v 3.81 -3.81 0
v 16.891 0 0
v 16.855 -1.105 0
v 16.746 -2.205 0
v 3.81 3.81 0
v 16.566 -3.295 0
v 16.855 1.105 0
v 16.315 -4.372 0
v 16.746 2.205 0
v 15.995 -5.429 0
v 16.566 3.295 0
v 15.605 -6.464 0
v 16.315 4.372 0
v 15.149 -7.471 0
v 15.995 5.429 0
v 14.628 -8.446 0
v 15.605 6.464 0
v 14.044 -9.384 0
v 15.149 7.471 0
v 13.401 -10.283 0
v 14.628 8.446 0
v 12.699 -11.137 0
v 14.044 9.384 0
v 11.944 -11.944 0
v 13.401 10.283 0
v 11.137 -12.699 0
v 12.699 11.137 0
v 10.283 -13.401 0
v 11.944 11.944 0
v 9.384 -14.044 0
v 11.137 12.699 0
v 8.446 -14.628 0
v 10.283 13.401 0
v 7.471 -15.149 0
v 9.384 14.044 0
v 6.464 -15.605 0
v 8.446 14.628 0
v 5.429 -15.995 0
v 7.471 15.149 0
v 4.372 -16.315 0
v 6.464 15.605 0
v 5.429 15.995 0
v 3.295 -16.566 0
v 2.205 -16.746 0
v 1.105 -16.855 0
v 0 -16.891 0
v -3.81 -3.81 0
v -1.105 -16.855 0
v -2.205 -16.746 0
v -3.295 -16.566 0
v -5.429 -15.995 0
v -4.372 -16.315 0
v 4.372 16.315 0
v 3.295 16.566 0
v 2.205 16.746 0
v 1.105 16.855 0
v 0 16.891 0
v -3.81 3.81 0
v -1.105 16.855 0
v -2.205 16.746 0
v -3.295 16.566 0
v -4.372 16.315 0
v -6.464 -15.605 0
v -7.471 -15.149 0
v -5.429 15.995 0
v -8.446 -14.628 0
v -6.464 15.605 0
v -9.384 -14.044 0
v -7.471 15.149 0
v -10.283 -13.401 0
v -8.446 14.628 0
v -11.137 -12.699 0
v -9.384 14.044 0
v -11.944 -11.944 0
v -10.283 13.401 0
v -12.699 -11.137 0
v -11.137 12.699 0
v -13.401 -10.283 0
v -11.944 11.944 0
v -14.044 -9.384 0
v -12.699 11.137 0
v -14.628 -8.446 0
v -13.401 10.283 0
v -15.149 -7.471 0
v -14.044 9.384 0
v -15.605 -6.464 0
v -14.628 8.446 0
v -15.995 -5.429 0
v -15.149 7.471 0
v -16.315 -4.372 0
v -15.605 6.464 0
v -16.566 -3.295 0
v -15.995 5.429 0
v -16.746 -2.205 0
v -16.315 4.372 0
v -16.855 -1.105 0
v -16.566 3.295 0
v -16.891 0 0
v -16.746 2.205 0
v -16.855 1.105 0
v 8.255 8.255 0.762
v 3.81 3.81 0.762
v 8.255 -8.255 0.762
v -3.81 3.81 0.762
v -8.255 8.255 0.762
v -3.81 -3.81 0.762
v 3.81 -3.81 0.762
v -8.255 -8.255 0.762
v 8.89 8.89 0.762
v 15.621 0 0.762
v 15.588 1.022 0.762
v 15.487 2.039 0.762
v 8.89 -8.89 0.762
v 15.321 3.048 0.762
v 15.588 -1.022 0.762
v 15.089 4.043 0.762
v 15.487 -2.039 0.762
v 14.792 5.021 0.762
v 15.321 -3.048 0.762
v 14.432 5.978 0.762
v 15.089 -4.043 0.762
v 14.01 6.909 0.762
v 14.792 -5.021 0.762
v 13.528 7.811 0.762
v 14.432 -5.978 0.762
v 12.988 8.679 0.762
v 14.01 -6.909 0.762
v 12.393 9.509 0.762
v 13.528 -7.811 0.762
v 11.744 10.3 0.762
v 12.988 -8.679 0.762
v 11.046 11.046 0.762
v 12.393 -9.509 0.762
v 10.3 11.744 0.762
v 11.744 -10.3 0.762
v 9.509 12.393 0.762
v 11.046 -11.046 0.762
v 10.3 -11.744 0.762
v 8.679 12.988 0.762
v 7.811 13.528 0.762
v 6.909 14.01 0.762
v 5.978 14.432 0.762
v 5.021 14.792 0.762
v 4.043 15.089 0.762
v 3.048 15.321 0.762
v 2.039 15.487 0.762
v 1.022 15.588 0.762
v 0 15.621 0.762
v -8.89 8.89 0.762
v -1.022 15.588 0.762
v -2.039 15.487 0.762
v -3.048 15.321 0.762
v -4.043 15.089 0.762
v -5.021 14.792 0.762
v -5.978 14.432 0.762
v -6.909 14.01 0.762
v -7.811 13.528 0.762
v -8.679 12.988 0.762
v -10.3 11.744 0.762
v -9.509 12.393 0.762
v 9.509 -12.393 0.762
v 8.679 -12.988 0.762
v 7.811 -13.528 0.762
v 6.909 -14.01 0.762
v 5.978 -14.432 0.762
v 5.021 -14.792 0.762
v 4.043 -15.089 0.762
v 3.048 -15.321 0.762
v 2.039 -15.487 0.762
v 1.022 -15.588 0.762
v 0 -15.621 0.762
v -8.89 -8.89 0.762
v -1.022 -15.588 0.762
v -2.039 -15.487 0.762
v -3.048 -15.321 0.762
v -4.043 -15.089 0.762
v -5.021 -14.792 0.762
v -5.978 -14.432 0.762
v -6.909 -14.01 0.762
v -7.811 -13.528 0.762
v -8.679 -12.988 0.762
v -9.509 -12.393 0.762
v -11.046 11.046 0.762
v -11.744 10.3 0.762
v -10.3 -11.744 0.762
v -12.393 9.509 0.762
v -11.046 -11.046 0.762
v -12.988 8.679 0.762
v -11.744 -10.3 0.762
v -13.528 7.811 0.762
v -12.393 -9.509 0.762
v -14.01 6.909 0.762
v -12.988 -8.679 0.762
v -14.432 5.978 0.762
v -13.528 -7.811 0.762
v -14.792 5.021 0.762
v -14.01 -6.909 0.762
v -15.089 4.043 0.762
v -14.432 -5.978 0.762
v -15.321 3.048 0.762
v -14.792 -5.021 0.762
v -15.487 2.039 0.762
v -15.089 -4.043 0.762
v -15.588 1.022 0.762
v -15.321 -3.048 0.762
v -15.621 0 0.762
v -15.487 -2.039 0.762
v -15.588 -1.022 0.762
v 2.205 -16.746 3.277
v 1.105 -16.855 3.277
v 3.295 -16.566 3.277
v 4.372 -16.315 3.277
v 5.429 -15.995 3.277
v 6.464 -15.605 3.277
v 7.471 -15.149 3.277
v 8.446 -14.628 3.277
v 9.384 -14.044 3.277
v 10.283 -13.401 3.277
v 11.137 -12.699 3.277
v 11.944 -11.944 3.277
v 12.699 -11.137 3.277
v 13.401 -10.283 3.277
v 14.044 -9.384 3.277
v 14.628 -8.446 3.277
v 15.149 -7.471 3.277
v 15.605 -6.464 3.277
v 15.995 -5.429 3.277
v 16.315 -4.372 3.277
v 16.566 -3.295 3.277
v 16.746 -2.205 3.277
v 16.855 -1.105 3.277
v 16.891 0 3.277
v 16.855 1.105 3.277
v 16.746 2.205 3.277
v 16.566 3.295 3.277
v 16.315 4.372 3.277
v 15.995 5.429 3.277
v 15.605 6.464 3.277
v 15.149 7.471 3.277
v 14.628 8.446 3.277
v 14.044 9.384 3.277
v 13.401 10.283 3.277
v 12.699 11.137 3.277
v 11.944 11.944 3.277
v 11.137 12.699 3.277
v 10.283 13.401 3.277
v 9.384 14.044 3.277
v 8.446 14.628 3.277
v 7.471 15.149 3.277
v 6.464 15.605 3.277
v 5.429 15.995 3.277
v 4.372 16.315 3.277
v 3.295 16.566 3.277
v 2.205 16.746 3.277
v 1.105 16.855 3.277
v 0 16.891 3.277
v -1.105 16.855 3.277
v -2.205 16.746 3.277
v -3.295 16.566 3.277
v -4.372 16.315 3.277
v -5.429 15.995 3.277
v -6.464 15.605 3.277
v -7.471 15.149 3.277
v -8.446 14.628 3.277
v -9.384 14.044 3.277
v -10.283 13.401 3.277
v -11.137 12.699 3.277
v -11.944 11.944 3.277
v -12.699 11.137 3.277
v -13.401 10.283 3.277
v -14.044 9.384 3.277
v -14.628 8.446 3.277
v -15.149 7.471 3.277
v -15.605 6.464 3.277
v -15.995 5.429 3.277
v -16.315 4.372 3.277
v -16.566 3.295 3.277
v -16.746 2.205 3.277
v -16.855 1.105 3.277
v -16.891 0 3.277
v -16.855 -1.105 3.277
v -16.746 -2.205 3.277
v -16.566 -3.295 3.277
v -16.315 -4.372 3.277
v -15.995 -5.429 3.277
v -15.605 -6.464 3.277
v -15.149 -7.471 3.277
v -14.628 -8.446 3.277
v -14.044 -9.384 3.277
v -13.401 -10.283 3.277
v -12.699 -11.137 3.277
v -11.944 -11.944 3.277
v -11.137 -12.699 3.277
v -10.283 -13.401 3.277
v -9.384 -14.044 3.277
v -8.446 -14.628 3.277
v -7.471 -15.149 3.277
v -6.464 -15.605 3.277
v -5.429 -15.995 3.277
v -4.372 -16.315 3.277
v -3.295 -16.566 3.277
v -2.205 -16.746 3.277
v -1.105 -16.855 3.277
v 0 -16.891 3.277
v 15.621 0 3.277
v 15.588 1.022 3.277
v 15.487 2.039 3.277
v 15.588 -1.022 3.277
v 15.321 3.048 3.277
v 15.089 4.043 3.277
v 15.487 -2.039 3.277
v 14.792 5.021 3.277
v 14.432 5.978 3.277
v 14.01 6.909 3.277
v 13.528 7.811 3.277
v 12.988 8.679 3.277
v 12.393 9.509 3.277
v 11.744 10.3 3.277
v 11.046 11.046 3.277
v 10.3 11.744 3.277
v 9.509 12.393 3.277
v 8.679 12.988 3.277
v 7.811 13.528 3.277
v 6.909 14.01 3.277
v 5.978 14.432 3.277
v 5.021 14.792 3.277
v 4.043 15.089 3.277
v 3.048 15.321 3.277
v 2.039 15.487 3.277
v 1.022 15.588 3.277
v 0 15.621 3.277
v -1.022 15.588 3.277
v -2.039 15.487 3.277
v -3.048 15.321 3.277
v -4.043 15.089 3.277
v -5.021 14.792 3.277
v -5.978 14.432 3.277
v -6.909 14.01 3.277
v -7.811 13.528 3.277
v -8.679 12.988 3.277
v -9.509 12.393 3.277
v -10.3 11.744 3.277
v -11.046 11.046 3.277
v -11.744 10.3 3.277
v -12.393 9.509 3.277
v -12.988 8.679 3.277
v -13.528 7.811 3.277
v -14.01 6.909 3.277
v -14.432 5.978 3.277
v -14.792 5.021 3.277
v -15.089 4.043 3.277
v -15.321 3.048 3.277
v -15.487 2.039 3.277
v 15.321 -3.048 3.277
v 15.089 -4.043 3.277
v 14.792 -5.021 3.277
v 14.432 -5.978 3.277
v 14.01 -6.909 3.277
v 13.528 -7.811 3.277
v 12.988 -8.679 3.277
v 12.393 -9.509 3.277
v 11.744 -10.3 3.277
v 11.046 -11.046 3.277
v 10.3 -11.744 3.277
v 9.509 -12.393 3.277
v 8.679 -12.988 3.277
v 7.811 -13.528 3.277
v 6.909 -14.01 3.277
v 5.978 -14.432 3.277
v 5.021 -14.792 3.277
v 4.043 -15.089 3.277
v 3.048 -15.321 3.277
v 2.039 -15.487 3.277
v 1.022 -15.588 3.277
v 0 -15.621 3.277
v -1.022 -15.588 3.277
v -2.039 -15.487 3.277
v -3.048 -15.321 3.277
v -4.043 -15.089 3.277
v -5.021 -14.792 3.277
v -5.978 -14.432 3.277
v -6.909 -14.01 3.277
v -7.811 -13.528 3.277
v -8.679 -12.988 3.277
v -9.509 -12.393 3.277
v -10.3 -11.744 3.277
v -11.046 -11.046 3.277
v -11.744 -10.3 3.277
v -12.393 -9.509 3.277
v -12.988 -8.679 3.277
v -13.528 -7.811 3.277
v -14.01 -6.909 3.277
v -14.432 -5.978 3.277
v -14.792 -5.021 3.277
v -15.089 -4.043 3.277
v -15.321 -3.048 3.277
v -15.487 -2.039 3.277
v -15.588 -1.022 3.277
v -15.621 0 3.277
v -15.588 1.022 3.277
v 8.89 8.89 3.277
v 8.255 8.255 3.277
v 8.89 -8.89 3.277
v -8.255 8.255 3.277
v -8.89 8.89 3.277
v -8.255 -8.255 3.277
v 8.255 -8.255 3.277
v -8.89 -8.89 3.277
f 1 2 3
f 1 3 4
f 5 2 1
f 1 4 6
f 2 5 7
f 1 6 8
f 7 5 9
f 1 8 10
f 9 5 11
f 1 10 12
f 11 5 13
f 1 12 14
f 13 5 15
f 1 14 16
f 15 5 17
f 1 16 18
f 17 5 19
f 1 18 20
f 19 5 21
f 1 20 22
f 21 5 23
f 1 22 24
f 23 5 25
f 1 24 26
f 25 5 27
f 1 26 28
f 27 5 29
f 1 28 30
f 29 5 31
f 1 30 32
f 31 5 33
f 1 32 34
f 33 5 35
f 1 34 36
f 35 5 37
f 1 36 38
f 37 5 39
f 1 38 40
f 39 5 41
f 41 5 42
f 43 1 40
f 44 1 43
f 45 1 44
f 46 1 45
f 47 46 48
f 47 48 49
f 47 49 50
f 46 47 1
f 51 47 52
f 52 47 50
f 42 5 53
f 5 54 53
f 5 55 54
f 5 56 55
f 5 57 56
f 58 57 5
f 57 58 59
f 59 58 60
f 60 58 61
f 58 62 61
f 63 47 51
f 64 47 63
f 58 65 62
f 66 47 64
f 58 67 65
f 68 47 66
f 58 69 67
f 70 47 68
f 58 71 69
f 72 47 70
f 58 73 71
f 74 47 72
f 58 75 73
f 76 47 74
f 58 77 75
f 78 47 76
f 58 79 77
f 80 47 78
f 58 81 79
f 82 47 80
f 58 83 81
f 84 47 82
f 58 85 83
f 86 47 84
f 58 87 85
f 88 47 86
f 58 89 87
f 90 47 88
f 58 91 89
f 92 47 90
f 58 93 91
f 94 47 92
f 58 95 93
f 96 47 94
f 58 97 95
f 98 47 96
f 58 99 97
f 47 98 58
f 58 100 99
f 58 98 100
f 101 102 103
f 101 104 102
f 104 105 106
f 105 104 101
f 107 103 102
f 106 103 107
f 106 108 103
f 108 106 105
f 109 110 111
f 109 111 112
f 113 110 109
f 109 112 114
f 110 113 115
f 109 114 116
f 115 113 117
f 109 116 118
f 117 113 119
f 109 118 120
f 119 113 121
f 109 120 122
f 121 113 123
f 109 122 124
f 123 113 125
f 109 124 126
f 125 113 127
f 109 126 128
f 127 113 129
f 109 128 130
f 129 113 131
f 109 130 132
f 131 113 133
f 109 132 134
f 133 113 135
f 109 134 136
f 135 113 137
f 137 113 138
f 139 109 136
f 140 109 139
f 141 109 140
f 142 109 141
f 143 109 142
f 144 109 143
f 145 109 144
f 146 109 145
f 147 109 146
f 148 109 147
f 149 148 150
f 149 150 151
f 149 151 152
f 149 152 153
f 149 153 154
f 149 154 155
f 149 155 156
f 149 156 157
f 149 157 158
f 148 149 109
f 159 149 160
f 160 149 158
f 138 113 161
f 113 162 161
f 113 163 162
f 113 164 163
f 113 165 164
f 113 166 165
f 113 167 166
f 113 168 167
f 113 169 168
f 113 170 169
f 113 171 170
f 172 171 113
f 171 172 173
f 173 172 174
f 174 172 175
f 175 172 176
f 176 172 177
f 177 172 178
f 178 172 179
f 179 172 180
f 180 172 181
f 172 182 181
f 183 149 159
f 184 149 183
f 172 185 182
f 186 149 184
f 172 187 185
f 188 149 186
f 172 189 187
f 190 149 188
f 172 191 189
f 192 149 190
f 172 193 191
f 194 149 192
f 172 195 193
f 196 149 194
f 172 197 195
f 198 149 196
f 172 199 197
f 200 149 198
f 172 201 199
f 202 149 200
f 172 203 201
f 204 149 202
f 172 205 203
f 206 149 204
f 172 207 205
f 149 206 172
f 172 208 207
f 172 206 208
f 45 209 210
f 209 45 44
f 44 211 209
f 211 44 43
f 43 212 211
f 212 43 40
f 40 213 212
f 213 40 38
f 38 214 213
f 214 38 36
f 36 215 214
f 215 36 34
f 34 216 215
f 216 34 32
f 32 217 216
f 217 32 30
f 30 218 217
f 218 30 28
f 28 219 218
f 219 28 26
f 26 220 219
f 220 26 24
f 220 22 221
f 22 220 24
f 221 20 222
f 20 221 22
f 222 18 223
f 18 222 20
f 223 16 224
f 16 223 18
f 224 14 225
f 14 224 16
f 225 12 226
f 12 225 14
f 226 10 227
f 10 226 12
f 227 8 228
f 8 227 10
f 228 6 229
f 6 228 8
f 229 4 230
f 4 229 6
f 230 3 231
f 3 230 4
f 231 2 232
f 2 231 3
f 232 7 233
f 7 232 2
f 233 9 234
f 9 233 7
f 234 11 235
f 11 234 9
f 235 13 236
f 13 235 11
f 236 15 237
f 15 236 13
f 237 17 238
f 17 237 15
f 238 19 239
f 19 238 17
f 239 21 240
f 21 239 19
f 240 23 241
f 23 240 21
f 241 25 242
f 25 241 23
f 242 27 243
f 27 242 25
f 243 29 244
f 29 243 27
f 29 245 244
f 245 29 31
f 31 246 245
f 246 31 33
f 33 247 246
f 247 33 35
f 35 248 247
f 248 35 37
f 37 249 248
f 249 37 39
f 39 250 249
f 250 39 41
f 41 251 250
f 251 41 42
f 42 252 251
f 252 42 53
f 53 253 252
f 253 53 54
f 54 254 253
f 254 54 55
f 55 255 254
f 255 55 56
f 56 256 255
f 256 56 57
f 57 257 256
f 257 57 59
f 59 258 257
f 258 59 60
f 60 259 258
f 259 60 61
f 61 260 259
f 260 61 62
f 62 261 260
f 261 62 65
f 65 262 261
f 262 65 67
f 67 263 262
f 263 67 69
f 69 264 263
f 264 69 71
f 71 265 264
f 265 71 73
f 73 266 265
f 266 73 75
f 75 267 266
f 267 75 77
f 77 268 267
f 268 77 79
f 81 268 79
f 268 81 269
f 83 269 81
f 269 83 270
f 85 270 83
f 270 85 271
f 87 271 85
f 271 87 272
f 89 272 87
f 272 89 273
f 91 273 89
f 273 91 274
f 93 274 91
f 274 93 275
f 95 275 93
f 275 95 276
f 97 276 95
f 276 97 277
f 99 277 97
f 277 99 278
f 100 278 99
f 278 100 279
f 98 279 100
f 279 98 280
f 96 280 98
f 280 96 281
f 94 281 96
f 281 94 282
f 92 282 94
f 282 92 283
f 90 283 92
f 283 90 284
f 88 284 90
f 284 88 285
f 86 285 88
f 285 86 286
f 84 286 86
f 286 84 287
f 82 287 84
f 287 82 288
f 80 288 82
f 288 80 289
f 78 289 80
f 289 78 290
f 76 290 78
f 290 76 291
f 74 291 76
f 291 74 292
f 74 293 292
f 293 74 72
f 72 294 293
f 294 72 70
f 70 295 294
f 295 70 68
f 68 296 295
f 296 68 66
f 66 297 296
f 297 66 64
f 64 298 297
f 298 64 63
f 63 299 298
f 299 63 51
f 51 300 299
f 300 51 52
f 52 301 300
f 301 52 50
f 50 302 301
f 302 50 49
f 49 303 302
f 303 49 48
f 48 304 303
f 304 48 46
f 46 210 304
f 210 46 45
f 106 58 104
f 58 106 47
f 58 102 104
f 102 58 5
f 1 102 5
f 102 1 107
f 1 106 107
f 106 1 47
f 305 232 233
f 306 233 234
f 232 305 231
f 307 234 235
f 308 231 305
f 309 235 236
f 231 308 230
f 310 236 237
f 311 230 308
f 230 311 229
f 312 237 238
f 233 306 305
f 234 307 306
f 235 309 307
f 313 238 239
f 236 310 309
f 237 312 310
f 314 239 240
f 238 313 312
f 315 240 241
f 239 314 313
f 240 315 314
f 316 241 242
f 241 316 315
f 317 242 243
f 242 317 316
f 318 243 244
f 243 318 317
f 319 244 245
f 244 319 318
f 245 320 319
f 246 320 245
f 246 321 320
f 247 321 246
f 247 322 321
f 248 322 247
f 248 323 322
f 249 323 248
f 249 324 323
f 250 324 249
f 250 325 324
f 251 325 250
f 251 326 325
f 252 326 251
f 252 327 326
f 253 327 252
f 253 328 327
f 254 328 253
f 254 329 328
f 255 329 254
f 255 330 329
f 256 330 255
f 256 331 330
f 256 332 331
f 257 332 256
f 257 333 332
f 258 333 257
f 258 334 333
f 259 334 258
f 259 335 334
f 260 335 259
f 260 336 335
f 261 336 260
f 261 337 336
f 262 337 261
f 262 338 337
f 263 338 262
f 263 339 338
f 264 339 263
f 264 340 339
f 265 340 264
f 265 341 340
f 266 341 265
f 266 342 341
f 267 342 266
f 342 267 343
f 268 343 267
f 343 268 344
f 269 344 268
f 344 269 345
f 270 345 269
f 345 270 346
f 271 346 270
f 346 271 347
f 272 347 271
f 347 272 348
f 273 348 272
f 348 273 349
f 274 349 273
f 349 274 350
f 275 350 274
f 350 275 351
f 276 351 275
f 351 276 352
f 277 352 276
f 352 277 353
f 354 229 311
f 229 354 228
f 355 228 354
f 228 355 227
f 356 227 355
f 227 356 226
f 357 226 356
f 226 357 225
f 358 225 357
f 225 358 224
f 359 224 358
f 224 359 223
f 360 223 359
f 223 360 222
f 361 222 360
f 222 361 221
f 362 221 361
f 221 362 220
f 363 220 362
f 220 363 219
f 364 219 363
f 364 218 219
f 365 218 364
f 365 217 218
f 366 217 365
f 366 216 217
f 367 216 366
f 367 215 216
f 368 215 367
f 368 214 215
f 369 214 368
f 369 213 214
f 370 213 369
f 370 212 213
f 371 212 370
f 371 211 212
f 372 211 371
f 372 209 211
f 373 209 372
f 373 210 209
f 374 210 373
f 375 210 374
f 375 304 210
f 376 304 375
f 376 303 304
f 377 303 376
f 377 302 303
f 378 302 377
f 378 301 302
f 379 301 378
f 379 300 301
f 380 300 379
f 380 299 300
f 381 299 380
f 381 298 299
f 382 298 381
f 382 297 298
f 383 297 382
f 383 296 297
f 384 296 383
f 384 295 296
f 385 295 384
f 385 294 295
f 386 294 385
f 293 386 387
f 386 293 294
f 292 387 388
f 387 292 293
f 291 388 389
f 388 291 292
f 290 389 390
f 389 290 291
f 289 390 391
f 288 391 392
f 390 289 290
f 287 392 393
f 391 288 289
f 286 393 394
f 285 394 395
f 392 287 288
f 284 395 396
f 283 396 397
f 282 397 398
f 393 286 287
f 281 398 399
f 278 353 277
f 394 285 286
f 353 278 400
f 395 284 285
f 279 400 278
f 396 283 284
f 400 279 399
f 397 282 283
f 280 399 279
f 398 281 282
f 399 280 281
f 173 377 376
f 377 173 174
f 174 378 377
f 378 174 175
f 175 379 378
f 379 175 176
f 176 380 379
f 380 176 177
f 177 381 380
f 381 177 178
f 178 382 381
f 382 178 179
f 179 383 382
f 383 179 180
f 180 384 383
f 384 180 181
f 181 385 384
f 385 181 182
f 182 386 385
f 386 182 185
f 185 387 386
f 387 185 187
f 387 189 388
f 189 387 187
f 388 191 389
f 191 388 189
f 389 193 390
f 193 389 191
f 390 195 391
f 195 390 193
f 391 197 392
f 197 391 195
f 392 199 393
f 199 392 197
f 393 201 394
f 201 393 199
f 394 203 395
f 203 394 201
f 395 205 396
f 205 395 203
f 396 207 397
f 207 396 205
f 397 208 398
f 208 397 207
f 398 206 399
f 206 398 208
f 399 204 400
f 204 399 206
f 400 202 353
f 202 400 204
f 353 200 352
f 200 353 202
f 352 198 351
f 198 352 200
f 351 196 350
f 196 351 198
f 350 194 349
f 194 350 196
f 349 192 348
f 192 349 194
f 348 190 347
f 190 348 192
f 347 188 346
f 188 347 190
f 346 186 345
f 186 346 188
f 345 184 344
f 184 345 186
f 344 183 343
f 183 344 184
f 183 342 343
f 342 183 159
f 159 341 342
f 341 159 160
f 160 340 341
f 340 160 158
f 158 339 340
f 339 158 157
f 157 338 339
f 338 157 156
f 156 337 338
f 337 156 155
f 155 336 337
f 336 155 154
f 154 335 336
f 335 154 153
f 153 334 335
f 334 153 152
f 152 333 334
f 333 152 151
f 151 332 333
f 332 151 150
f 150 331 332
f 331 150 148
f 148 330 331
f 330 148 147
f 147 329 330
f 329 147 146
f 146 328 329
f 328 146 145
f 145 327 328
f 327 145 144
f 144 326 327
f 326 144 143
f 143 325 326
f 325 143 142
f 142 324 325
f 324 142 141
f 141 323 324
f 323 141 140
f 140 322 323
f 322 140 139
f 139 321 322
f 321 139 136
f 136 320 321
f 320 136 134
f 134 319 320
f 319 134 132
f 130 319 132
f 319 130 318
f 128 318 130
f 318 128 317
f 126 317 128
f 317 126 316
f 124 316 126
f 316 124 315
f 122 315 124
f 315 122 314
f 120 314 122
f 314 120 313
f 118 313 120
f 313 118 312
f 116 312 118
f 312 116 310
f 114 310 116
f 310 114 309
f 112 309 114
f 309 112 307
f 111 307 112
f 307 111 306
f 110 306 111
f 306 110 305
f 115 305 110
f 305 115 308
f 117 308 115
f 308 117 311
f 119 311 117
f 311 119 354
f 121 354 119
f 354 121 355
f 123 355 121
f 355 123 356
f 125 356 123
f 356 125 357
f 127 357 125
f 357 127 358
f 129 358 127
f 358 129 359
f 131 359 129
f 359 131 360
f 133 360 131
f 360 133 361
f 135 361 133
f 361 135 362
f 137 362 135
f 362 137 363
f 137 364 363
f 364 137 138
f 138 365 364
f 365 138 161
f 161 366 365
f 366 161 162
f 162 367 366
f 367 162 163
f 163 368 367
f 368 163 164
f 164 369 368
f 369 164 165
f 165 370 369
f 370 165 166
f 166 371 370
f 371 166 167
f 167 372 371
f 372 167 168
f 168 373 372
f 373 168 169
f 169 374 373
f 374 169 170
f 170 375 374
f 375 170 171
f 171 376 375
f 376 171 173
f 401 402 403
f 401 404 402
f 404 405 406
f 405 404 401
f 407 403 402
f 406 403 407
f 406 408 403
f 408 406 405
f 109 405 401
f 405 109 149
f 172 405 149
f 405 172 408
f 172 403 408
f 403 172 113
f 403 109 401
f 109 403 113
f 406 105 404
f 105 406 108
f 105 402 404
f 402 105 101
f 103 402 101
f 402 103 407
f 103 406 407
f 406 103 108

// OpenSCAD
ViewScale = [0.0254, 0.0254, 0.0254];

module barrel()
{
    difference() {
        circle(1330/2, $fn=96);
        circle(1230/2, $fn=96);
    }
}

module mask()
{
    difference() {
        circle(1330/2, $fn=96);
        square(300, center=true);
    }
}

module maskmount()
{
    difference() {
        square(700, center=true);
        square(650, center=true);
    }
}

scale(ViewScale)
{
    linear_extrude(30)
    mask();
    translate([0, 0, 29])
    linear_extrude(100)
    barrel();
    translate([0, 0, 29])
    linear_extrude(100)
    maskmount();
}
